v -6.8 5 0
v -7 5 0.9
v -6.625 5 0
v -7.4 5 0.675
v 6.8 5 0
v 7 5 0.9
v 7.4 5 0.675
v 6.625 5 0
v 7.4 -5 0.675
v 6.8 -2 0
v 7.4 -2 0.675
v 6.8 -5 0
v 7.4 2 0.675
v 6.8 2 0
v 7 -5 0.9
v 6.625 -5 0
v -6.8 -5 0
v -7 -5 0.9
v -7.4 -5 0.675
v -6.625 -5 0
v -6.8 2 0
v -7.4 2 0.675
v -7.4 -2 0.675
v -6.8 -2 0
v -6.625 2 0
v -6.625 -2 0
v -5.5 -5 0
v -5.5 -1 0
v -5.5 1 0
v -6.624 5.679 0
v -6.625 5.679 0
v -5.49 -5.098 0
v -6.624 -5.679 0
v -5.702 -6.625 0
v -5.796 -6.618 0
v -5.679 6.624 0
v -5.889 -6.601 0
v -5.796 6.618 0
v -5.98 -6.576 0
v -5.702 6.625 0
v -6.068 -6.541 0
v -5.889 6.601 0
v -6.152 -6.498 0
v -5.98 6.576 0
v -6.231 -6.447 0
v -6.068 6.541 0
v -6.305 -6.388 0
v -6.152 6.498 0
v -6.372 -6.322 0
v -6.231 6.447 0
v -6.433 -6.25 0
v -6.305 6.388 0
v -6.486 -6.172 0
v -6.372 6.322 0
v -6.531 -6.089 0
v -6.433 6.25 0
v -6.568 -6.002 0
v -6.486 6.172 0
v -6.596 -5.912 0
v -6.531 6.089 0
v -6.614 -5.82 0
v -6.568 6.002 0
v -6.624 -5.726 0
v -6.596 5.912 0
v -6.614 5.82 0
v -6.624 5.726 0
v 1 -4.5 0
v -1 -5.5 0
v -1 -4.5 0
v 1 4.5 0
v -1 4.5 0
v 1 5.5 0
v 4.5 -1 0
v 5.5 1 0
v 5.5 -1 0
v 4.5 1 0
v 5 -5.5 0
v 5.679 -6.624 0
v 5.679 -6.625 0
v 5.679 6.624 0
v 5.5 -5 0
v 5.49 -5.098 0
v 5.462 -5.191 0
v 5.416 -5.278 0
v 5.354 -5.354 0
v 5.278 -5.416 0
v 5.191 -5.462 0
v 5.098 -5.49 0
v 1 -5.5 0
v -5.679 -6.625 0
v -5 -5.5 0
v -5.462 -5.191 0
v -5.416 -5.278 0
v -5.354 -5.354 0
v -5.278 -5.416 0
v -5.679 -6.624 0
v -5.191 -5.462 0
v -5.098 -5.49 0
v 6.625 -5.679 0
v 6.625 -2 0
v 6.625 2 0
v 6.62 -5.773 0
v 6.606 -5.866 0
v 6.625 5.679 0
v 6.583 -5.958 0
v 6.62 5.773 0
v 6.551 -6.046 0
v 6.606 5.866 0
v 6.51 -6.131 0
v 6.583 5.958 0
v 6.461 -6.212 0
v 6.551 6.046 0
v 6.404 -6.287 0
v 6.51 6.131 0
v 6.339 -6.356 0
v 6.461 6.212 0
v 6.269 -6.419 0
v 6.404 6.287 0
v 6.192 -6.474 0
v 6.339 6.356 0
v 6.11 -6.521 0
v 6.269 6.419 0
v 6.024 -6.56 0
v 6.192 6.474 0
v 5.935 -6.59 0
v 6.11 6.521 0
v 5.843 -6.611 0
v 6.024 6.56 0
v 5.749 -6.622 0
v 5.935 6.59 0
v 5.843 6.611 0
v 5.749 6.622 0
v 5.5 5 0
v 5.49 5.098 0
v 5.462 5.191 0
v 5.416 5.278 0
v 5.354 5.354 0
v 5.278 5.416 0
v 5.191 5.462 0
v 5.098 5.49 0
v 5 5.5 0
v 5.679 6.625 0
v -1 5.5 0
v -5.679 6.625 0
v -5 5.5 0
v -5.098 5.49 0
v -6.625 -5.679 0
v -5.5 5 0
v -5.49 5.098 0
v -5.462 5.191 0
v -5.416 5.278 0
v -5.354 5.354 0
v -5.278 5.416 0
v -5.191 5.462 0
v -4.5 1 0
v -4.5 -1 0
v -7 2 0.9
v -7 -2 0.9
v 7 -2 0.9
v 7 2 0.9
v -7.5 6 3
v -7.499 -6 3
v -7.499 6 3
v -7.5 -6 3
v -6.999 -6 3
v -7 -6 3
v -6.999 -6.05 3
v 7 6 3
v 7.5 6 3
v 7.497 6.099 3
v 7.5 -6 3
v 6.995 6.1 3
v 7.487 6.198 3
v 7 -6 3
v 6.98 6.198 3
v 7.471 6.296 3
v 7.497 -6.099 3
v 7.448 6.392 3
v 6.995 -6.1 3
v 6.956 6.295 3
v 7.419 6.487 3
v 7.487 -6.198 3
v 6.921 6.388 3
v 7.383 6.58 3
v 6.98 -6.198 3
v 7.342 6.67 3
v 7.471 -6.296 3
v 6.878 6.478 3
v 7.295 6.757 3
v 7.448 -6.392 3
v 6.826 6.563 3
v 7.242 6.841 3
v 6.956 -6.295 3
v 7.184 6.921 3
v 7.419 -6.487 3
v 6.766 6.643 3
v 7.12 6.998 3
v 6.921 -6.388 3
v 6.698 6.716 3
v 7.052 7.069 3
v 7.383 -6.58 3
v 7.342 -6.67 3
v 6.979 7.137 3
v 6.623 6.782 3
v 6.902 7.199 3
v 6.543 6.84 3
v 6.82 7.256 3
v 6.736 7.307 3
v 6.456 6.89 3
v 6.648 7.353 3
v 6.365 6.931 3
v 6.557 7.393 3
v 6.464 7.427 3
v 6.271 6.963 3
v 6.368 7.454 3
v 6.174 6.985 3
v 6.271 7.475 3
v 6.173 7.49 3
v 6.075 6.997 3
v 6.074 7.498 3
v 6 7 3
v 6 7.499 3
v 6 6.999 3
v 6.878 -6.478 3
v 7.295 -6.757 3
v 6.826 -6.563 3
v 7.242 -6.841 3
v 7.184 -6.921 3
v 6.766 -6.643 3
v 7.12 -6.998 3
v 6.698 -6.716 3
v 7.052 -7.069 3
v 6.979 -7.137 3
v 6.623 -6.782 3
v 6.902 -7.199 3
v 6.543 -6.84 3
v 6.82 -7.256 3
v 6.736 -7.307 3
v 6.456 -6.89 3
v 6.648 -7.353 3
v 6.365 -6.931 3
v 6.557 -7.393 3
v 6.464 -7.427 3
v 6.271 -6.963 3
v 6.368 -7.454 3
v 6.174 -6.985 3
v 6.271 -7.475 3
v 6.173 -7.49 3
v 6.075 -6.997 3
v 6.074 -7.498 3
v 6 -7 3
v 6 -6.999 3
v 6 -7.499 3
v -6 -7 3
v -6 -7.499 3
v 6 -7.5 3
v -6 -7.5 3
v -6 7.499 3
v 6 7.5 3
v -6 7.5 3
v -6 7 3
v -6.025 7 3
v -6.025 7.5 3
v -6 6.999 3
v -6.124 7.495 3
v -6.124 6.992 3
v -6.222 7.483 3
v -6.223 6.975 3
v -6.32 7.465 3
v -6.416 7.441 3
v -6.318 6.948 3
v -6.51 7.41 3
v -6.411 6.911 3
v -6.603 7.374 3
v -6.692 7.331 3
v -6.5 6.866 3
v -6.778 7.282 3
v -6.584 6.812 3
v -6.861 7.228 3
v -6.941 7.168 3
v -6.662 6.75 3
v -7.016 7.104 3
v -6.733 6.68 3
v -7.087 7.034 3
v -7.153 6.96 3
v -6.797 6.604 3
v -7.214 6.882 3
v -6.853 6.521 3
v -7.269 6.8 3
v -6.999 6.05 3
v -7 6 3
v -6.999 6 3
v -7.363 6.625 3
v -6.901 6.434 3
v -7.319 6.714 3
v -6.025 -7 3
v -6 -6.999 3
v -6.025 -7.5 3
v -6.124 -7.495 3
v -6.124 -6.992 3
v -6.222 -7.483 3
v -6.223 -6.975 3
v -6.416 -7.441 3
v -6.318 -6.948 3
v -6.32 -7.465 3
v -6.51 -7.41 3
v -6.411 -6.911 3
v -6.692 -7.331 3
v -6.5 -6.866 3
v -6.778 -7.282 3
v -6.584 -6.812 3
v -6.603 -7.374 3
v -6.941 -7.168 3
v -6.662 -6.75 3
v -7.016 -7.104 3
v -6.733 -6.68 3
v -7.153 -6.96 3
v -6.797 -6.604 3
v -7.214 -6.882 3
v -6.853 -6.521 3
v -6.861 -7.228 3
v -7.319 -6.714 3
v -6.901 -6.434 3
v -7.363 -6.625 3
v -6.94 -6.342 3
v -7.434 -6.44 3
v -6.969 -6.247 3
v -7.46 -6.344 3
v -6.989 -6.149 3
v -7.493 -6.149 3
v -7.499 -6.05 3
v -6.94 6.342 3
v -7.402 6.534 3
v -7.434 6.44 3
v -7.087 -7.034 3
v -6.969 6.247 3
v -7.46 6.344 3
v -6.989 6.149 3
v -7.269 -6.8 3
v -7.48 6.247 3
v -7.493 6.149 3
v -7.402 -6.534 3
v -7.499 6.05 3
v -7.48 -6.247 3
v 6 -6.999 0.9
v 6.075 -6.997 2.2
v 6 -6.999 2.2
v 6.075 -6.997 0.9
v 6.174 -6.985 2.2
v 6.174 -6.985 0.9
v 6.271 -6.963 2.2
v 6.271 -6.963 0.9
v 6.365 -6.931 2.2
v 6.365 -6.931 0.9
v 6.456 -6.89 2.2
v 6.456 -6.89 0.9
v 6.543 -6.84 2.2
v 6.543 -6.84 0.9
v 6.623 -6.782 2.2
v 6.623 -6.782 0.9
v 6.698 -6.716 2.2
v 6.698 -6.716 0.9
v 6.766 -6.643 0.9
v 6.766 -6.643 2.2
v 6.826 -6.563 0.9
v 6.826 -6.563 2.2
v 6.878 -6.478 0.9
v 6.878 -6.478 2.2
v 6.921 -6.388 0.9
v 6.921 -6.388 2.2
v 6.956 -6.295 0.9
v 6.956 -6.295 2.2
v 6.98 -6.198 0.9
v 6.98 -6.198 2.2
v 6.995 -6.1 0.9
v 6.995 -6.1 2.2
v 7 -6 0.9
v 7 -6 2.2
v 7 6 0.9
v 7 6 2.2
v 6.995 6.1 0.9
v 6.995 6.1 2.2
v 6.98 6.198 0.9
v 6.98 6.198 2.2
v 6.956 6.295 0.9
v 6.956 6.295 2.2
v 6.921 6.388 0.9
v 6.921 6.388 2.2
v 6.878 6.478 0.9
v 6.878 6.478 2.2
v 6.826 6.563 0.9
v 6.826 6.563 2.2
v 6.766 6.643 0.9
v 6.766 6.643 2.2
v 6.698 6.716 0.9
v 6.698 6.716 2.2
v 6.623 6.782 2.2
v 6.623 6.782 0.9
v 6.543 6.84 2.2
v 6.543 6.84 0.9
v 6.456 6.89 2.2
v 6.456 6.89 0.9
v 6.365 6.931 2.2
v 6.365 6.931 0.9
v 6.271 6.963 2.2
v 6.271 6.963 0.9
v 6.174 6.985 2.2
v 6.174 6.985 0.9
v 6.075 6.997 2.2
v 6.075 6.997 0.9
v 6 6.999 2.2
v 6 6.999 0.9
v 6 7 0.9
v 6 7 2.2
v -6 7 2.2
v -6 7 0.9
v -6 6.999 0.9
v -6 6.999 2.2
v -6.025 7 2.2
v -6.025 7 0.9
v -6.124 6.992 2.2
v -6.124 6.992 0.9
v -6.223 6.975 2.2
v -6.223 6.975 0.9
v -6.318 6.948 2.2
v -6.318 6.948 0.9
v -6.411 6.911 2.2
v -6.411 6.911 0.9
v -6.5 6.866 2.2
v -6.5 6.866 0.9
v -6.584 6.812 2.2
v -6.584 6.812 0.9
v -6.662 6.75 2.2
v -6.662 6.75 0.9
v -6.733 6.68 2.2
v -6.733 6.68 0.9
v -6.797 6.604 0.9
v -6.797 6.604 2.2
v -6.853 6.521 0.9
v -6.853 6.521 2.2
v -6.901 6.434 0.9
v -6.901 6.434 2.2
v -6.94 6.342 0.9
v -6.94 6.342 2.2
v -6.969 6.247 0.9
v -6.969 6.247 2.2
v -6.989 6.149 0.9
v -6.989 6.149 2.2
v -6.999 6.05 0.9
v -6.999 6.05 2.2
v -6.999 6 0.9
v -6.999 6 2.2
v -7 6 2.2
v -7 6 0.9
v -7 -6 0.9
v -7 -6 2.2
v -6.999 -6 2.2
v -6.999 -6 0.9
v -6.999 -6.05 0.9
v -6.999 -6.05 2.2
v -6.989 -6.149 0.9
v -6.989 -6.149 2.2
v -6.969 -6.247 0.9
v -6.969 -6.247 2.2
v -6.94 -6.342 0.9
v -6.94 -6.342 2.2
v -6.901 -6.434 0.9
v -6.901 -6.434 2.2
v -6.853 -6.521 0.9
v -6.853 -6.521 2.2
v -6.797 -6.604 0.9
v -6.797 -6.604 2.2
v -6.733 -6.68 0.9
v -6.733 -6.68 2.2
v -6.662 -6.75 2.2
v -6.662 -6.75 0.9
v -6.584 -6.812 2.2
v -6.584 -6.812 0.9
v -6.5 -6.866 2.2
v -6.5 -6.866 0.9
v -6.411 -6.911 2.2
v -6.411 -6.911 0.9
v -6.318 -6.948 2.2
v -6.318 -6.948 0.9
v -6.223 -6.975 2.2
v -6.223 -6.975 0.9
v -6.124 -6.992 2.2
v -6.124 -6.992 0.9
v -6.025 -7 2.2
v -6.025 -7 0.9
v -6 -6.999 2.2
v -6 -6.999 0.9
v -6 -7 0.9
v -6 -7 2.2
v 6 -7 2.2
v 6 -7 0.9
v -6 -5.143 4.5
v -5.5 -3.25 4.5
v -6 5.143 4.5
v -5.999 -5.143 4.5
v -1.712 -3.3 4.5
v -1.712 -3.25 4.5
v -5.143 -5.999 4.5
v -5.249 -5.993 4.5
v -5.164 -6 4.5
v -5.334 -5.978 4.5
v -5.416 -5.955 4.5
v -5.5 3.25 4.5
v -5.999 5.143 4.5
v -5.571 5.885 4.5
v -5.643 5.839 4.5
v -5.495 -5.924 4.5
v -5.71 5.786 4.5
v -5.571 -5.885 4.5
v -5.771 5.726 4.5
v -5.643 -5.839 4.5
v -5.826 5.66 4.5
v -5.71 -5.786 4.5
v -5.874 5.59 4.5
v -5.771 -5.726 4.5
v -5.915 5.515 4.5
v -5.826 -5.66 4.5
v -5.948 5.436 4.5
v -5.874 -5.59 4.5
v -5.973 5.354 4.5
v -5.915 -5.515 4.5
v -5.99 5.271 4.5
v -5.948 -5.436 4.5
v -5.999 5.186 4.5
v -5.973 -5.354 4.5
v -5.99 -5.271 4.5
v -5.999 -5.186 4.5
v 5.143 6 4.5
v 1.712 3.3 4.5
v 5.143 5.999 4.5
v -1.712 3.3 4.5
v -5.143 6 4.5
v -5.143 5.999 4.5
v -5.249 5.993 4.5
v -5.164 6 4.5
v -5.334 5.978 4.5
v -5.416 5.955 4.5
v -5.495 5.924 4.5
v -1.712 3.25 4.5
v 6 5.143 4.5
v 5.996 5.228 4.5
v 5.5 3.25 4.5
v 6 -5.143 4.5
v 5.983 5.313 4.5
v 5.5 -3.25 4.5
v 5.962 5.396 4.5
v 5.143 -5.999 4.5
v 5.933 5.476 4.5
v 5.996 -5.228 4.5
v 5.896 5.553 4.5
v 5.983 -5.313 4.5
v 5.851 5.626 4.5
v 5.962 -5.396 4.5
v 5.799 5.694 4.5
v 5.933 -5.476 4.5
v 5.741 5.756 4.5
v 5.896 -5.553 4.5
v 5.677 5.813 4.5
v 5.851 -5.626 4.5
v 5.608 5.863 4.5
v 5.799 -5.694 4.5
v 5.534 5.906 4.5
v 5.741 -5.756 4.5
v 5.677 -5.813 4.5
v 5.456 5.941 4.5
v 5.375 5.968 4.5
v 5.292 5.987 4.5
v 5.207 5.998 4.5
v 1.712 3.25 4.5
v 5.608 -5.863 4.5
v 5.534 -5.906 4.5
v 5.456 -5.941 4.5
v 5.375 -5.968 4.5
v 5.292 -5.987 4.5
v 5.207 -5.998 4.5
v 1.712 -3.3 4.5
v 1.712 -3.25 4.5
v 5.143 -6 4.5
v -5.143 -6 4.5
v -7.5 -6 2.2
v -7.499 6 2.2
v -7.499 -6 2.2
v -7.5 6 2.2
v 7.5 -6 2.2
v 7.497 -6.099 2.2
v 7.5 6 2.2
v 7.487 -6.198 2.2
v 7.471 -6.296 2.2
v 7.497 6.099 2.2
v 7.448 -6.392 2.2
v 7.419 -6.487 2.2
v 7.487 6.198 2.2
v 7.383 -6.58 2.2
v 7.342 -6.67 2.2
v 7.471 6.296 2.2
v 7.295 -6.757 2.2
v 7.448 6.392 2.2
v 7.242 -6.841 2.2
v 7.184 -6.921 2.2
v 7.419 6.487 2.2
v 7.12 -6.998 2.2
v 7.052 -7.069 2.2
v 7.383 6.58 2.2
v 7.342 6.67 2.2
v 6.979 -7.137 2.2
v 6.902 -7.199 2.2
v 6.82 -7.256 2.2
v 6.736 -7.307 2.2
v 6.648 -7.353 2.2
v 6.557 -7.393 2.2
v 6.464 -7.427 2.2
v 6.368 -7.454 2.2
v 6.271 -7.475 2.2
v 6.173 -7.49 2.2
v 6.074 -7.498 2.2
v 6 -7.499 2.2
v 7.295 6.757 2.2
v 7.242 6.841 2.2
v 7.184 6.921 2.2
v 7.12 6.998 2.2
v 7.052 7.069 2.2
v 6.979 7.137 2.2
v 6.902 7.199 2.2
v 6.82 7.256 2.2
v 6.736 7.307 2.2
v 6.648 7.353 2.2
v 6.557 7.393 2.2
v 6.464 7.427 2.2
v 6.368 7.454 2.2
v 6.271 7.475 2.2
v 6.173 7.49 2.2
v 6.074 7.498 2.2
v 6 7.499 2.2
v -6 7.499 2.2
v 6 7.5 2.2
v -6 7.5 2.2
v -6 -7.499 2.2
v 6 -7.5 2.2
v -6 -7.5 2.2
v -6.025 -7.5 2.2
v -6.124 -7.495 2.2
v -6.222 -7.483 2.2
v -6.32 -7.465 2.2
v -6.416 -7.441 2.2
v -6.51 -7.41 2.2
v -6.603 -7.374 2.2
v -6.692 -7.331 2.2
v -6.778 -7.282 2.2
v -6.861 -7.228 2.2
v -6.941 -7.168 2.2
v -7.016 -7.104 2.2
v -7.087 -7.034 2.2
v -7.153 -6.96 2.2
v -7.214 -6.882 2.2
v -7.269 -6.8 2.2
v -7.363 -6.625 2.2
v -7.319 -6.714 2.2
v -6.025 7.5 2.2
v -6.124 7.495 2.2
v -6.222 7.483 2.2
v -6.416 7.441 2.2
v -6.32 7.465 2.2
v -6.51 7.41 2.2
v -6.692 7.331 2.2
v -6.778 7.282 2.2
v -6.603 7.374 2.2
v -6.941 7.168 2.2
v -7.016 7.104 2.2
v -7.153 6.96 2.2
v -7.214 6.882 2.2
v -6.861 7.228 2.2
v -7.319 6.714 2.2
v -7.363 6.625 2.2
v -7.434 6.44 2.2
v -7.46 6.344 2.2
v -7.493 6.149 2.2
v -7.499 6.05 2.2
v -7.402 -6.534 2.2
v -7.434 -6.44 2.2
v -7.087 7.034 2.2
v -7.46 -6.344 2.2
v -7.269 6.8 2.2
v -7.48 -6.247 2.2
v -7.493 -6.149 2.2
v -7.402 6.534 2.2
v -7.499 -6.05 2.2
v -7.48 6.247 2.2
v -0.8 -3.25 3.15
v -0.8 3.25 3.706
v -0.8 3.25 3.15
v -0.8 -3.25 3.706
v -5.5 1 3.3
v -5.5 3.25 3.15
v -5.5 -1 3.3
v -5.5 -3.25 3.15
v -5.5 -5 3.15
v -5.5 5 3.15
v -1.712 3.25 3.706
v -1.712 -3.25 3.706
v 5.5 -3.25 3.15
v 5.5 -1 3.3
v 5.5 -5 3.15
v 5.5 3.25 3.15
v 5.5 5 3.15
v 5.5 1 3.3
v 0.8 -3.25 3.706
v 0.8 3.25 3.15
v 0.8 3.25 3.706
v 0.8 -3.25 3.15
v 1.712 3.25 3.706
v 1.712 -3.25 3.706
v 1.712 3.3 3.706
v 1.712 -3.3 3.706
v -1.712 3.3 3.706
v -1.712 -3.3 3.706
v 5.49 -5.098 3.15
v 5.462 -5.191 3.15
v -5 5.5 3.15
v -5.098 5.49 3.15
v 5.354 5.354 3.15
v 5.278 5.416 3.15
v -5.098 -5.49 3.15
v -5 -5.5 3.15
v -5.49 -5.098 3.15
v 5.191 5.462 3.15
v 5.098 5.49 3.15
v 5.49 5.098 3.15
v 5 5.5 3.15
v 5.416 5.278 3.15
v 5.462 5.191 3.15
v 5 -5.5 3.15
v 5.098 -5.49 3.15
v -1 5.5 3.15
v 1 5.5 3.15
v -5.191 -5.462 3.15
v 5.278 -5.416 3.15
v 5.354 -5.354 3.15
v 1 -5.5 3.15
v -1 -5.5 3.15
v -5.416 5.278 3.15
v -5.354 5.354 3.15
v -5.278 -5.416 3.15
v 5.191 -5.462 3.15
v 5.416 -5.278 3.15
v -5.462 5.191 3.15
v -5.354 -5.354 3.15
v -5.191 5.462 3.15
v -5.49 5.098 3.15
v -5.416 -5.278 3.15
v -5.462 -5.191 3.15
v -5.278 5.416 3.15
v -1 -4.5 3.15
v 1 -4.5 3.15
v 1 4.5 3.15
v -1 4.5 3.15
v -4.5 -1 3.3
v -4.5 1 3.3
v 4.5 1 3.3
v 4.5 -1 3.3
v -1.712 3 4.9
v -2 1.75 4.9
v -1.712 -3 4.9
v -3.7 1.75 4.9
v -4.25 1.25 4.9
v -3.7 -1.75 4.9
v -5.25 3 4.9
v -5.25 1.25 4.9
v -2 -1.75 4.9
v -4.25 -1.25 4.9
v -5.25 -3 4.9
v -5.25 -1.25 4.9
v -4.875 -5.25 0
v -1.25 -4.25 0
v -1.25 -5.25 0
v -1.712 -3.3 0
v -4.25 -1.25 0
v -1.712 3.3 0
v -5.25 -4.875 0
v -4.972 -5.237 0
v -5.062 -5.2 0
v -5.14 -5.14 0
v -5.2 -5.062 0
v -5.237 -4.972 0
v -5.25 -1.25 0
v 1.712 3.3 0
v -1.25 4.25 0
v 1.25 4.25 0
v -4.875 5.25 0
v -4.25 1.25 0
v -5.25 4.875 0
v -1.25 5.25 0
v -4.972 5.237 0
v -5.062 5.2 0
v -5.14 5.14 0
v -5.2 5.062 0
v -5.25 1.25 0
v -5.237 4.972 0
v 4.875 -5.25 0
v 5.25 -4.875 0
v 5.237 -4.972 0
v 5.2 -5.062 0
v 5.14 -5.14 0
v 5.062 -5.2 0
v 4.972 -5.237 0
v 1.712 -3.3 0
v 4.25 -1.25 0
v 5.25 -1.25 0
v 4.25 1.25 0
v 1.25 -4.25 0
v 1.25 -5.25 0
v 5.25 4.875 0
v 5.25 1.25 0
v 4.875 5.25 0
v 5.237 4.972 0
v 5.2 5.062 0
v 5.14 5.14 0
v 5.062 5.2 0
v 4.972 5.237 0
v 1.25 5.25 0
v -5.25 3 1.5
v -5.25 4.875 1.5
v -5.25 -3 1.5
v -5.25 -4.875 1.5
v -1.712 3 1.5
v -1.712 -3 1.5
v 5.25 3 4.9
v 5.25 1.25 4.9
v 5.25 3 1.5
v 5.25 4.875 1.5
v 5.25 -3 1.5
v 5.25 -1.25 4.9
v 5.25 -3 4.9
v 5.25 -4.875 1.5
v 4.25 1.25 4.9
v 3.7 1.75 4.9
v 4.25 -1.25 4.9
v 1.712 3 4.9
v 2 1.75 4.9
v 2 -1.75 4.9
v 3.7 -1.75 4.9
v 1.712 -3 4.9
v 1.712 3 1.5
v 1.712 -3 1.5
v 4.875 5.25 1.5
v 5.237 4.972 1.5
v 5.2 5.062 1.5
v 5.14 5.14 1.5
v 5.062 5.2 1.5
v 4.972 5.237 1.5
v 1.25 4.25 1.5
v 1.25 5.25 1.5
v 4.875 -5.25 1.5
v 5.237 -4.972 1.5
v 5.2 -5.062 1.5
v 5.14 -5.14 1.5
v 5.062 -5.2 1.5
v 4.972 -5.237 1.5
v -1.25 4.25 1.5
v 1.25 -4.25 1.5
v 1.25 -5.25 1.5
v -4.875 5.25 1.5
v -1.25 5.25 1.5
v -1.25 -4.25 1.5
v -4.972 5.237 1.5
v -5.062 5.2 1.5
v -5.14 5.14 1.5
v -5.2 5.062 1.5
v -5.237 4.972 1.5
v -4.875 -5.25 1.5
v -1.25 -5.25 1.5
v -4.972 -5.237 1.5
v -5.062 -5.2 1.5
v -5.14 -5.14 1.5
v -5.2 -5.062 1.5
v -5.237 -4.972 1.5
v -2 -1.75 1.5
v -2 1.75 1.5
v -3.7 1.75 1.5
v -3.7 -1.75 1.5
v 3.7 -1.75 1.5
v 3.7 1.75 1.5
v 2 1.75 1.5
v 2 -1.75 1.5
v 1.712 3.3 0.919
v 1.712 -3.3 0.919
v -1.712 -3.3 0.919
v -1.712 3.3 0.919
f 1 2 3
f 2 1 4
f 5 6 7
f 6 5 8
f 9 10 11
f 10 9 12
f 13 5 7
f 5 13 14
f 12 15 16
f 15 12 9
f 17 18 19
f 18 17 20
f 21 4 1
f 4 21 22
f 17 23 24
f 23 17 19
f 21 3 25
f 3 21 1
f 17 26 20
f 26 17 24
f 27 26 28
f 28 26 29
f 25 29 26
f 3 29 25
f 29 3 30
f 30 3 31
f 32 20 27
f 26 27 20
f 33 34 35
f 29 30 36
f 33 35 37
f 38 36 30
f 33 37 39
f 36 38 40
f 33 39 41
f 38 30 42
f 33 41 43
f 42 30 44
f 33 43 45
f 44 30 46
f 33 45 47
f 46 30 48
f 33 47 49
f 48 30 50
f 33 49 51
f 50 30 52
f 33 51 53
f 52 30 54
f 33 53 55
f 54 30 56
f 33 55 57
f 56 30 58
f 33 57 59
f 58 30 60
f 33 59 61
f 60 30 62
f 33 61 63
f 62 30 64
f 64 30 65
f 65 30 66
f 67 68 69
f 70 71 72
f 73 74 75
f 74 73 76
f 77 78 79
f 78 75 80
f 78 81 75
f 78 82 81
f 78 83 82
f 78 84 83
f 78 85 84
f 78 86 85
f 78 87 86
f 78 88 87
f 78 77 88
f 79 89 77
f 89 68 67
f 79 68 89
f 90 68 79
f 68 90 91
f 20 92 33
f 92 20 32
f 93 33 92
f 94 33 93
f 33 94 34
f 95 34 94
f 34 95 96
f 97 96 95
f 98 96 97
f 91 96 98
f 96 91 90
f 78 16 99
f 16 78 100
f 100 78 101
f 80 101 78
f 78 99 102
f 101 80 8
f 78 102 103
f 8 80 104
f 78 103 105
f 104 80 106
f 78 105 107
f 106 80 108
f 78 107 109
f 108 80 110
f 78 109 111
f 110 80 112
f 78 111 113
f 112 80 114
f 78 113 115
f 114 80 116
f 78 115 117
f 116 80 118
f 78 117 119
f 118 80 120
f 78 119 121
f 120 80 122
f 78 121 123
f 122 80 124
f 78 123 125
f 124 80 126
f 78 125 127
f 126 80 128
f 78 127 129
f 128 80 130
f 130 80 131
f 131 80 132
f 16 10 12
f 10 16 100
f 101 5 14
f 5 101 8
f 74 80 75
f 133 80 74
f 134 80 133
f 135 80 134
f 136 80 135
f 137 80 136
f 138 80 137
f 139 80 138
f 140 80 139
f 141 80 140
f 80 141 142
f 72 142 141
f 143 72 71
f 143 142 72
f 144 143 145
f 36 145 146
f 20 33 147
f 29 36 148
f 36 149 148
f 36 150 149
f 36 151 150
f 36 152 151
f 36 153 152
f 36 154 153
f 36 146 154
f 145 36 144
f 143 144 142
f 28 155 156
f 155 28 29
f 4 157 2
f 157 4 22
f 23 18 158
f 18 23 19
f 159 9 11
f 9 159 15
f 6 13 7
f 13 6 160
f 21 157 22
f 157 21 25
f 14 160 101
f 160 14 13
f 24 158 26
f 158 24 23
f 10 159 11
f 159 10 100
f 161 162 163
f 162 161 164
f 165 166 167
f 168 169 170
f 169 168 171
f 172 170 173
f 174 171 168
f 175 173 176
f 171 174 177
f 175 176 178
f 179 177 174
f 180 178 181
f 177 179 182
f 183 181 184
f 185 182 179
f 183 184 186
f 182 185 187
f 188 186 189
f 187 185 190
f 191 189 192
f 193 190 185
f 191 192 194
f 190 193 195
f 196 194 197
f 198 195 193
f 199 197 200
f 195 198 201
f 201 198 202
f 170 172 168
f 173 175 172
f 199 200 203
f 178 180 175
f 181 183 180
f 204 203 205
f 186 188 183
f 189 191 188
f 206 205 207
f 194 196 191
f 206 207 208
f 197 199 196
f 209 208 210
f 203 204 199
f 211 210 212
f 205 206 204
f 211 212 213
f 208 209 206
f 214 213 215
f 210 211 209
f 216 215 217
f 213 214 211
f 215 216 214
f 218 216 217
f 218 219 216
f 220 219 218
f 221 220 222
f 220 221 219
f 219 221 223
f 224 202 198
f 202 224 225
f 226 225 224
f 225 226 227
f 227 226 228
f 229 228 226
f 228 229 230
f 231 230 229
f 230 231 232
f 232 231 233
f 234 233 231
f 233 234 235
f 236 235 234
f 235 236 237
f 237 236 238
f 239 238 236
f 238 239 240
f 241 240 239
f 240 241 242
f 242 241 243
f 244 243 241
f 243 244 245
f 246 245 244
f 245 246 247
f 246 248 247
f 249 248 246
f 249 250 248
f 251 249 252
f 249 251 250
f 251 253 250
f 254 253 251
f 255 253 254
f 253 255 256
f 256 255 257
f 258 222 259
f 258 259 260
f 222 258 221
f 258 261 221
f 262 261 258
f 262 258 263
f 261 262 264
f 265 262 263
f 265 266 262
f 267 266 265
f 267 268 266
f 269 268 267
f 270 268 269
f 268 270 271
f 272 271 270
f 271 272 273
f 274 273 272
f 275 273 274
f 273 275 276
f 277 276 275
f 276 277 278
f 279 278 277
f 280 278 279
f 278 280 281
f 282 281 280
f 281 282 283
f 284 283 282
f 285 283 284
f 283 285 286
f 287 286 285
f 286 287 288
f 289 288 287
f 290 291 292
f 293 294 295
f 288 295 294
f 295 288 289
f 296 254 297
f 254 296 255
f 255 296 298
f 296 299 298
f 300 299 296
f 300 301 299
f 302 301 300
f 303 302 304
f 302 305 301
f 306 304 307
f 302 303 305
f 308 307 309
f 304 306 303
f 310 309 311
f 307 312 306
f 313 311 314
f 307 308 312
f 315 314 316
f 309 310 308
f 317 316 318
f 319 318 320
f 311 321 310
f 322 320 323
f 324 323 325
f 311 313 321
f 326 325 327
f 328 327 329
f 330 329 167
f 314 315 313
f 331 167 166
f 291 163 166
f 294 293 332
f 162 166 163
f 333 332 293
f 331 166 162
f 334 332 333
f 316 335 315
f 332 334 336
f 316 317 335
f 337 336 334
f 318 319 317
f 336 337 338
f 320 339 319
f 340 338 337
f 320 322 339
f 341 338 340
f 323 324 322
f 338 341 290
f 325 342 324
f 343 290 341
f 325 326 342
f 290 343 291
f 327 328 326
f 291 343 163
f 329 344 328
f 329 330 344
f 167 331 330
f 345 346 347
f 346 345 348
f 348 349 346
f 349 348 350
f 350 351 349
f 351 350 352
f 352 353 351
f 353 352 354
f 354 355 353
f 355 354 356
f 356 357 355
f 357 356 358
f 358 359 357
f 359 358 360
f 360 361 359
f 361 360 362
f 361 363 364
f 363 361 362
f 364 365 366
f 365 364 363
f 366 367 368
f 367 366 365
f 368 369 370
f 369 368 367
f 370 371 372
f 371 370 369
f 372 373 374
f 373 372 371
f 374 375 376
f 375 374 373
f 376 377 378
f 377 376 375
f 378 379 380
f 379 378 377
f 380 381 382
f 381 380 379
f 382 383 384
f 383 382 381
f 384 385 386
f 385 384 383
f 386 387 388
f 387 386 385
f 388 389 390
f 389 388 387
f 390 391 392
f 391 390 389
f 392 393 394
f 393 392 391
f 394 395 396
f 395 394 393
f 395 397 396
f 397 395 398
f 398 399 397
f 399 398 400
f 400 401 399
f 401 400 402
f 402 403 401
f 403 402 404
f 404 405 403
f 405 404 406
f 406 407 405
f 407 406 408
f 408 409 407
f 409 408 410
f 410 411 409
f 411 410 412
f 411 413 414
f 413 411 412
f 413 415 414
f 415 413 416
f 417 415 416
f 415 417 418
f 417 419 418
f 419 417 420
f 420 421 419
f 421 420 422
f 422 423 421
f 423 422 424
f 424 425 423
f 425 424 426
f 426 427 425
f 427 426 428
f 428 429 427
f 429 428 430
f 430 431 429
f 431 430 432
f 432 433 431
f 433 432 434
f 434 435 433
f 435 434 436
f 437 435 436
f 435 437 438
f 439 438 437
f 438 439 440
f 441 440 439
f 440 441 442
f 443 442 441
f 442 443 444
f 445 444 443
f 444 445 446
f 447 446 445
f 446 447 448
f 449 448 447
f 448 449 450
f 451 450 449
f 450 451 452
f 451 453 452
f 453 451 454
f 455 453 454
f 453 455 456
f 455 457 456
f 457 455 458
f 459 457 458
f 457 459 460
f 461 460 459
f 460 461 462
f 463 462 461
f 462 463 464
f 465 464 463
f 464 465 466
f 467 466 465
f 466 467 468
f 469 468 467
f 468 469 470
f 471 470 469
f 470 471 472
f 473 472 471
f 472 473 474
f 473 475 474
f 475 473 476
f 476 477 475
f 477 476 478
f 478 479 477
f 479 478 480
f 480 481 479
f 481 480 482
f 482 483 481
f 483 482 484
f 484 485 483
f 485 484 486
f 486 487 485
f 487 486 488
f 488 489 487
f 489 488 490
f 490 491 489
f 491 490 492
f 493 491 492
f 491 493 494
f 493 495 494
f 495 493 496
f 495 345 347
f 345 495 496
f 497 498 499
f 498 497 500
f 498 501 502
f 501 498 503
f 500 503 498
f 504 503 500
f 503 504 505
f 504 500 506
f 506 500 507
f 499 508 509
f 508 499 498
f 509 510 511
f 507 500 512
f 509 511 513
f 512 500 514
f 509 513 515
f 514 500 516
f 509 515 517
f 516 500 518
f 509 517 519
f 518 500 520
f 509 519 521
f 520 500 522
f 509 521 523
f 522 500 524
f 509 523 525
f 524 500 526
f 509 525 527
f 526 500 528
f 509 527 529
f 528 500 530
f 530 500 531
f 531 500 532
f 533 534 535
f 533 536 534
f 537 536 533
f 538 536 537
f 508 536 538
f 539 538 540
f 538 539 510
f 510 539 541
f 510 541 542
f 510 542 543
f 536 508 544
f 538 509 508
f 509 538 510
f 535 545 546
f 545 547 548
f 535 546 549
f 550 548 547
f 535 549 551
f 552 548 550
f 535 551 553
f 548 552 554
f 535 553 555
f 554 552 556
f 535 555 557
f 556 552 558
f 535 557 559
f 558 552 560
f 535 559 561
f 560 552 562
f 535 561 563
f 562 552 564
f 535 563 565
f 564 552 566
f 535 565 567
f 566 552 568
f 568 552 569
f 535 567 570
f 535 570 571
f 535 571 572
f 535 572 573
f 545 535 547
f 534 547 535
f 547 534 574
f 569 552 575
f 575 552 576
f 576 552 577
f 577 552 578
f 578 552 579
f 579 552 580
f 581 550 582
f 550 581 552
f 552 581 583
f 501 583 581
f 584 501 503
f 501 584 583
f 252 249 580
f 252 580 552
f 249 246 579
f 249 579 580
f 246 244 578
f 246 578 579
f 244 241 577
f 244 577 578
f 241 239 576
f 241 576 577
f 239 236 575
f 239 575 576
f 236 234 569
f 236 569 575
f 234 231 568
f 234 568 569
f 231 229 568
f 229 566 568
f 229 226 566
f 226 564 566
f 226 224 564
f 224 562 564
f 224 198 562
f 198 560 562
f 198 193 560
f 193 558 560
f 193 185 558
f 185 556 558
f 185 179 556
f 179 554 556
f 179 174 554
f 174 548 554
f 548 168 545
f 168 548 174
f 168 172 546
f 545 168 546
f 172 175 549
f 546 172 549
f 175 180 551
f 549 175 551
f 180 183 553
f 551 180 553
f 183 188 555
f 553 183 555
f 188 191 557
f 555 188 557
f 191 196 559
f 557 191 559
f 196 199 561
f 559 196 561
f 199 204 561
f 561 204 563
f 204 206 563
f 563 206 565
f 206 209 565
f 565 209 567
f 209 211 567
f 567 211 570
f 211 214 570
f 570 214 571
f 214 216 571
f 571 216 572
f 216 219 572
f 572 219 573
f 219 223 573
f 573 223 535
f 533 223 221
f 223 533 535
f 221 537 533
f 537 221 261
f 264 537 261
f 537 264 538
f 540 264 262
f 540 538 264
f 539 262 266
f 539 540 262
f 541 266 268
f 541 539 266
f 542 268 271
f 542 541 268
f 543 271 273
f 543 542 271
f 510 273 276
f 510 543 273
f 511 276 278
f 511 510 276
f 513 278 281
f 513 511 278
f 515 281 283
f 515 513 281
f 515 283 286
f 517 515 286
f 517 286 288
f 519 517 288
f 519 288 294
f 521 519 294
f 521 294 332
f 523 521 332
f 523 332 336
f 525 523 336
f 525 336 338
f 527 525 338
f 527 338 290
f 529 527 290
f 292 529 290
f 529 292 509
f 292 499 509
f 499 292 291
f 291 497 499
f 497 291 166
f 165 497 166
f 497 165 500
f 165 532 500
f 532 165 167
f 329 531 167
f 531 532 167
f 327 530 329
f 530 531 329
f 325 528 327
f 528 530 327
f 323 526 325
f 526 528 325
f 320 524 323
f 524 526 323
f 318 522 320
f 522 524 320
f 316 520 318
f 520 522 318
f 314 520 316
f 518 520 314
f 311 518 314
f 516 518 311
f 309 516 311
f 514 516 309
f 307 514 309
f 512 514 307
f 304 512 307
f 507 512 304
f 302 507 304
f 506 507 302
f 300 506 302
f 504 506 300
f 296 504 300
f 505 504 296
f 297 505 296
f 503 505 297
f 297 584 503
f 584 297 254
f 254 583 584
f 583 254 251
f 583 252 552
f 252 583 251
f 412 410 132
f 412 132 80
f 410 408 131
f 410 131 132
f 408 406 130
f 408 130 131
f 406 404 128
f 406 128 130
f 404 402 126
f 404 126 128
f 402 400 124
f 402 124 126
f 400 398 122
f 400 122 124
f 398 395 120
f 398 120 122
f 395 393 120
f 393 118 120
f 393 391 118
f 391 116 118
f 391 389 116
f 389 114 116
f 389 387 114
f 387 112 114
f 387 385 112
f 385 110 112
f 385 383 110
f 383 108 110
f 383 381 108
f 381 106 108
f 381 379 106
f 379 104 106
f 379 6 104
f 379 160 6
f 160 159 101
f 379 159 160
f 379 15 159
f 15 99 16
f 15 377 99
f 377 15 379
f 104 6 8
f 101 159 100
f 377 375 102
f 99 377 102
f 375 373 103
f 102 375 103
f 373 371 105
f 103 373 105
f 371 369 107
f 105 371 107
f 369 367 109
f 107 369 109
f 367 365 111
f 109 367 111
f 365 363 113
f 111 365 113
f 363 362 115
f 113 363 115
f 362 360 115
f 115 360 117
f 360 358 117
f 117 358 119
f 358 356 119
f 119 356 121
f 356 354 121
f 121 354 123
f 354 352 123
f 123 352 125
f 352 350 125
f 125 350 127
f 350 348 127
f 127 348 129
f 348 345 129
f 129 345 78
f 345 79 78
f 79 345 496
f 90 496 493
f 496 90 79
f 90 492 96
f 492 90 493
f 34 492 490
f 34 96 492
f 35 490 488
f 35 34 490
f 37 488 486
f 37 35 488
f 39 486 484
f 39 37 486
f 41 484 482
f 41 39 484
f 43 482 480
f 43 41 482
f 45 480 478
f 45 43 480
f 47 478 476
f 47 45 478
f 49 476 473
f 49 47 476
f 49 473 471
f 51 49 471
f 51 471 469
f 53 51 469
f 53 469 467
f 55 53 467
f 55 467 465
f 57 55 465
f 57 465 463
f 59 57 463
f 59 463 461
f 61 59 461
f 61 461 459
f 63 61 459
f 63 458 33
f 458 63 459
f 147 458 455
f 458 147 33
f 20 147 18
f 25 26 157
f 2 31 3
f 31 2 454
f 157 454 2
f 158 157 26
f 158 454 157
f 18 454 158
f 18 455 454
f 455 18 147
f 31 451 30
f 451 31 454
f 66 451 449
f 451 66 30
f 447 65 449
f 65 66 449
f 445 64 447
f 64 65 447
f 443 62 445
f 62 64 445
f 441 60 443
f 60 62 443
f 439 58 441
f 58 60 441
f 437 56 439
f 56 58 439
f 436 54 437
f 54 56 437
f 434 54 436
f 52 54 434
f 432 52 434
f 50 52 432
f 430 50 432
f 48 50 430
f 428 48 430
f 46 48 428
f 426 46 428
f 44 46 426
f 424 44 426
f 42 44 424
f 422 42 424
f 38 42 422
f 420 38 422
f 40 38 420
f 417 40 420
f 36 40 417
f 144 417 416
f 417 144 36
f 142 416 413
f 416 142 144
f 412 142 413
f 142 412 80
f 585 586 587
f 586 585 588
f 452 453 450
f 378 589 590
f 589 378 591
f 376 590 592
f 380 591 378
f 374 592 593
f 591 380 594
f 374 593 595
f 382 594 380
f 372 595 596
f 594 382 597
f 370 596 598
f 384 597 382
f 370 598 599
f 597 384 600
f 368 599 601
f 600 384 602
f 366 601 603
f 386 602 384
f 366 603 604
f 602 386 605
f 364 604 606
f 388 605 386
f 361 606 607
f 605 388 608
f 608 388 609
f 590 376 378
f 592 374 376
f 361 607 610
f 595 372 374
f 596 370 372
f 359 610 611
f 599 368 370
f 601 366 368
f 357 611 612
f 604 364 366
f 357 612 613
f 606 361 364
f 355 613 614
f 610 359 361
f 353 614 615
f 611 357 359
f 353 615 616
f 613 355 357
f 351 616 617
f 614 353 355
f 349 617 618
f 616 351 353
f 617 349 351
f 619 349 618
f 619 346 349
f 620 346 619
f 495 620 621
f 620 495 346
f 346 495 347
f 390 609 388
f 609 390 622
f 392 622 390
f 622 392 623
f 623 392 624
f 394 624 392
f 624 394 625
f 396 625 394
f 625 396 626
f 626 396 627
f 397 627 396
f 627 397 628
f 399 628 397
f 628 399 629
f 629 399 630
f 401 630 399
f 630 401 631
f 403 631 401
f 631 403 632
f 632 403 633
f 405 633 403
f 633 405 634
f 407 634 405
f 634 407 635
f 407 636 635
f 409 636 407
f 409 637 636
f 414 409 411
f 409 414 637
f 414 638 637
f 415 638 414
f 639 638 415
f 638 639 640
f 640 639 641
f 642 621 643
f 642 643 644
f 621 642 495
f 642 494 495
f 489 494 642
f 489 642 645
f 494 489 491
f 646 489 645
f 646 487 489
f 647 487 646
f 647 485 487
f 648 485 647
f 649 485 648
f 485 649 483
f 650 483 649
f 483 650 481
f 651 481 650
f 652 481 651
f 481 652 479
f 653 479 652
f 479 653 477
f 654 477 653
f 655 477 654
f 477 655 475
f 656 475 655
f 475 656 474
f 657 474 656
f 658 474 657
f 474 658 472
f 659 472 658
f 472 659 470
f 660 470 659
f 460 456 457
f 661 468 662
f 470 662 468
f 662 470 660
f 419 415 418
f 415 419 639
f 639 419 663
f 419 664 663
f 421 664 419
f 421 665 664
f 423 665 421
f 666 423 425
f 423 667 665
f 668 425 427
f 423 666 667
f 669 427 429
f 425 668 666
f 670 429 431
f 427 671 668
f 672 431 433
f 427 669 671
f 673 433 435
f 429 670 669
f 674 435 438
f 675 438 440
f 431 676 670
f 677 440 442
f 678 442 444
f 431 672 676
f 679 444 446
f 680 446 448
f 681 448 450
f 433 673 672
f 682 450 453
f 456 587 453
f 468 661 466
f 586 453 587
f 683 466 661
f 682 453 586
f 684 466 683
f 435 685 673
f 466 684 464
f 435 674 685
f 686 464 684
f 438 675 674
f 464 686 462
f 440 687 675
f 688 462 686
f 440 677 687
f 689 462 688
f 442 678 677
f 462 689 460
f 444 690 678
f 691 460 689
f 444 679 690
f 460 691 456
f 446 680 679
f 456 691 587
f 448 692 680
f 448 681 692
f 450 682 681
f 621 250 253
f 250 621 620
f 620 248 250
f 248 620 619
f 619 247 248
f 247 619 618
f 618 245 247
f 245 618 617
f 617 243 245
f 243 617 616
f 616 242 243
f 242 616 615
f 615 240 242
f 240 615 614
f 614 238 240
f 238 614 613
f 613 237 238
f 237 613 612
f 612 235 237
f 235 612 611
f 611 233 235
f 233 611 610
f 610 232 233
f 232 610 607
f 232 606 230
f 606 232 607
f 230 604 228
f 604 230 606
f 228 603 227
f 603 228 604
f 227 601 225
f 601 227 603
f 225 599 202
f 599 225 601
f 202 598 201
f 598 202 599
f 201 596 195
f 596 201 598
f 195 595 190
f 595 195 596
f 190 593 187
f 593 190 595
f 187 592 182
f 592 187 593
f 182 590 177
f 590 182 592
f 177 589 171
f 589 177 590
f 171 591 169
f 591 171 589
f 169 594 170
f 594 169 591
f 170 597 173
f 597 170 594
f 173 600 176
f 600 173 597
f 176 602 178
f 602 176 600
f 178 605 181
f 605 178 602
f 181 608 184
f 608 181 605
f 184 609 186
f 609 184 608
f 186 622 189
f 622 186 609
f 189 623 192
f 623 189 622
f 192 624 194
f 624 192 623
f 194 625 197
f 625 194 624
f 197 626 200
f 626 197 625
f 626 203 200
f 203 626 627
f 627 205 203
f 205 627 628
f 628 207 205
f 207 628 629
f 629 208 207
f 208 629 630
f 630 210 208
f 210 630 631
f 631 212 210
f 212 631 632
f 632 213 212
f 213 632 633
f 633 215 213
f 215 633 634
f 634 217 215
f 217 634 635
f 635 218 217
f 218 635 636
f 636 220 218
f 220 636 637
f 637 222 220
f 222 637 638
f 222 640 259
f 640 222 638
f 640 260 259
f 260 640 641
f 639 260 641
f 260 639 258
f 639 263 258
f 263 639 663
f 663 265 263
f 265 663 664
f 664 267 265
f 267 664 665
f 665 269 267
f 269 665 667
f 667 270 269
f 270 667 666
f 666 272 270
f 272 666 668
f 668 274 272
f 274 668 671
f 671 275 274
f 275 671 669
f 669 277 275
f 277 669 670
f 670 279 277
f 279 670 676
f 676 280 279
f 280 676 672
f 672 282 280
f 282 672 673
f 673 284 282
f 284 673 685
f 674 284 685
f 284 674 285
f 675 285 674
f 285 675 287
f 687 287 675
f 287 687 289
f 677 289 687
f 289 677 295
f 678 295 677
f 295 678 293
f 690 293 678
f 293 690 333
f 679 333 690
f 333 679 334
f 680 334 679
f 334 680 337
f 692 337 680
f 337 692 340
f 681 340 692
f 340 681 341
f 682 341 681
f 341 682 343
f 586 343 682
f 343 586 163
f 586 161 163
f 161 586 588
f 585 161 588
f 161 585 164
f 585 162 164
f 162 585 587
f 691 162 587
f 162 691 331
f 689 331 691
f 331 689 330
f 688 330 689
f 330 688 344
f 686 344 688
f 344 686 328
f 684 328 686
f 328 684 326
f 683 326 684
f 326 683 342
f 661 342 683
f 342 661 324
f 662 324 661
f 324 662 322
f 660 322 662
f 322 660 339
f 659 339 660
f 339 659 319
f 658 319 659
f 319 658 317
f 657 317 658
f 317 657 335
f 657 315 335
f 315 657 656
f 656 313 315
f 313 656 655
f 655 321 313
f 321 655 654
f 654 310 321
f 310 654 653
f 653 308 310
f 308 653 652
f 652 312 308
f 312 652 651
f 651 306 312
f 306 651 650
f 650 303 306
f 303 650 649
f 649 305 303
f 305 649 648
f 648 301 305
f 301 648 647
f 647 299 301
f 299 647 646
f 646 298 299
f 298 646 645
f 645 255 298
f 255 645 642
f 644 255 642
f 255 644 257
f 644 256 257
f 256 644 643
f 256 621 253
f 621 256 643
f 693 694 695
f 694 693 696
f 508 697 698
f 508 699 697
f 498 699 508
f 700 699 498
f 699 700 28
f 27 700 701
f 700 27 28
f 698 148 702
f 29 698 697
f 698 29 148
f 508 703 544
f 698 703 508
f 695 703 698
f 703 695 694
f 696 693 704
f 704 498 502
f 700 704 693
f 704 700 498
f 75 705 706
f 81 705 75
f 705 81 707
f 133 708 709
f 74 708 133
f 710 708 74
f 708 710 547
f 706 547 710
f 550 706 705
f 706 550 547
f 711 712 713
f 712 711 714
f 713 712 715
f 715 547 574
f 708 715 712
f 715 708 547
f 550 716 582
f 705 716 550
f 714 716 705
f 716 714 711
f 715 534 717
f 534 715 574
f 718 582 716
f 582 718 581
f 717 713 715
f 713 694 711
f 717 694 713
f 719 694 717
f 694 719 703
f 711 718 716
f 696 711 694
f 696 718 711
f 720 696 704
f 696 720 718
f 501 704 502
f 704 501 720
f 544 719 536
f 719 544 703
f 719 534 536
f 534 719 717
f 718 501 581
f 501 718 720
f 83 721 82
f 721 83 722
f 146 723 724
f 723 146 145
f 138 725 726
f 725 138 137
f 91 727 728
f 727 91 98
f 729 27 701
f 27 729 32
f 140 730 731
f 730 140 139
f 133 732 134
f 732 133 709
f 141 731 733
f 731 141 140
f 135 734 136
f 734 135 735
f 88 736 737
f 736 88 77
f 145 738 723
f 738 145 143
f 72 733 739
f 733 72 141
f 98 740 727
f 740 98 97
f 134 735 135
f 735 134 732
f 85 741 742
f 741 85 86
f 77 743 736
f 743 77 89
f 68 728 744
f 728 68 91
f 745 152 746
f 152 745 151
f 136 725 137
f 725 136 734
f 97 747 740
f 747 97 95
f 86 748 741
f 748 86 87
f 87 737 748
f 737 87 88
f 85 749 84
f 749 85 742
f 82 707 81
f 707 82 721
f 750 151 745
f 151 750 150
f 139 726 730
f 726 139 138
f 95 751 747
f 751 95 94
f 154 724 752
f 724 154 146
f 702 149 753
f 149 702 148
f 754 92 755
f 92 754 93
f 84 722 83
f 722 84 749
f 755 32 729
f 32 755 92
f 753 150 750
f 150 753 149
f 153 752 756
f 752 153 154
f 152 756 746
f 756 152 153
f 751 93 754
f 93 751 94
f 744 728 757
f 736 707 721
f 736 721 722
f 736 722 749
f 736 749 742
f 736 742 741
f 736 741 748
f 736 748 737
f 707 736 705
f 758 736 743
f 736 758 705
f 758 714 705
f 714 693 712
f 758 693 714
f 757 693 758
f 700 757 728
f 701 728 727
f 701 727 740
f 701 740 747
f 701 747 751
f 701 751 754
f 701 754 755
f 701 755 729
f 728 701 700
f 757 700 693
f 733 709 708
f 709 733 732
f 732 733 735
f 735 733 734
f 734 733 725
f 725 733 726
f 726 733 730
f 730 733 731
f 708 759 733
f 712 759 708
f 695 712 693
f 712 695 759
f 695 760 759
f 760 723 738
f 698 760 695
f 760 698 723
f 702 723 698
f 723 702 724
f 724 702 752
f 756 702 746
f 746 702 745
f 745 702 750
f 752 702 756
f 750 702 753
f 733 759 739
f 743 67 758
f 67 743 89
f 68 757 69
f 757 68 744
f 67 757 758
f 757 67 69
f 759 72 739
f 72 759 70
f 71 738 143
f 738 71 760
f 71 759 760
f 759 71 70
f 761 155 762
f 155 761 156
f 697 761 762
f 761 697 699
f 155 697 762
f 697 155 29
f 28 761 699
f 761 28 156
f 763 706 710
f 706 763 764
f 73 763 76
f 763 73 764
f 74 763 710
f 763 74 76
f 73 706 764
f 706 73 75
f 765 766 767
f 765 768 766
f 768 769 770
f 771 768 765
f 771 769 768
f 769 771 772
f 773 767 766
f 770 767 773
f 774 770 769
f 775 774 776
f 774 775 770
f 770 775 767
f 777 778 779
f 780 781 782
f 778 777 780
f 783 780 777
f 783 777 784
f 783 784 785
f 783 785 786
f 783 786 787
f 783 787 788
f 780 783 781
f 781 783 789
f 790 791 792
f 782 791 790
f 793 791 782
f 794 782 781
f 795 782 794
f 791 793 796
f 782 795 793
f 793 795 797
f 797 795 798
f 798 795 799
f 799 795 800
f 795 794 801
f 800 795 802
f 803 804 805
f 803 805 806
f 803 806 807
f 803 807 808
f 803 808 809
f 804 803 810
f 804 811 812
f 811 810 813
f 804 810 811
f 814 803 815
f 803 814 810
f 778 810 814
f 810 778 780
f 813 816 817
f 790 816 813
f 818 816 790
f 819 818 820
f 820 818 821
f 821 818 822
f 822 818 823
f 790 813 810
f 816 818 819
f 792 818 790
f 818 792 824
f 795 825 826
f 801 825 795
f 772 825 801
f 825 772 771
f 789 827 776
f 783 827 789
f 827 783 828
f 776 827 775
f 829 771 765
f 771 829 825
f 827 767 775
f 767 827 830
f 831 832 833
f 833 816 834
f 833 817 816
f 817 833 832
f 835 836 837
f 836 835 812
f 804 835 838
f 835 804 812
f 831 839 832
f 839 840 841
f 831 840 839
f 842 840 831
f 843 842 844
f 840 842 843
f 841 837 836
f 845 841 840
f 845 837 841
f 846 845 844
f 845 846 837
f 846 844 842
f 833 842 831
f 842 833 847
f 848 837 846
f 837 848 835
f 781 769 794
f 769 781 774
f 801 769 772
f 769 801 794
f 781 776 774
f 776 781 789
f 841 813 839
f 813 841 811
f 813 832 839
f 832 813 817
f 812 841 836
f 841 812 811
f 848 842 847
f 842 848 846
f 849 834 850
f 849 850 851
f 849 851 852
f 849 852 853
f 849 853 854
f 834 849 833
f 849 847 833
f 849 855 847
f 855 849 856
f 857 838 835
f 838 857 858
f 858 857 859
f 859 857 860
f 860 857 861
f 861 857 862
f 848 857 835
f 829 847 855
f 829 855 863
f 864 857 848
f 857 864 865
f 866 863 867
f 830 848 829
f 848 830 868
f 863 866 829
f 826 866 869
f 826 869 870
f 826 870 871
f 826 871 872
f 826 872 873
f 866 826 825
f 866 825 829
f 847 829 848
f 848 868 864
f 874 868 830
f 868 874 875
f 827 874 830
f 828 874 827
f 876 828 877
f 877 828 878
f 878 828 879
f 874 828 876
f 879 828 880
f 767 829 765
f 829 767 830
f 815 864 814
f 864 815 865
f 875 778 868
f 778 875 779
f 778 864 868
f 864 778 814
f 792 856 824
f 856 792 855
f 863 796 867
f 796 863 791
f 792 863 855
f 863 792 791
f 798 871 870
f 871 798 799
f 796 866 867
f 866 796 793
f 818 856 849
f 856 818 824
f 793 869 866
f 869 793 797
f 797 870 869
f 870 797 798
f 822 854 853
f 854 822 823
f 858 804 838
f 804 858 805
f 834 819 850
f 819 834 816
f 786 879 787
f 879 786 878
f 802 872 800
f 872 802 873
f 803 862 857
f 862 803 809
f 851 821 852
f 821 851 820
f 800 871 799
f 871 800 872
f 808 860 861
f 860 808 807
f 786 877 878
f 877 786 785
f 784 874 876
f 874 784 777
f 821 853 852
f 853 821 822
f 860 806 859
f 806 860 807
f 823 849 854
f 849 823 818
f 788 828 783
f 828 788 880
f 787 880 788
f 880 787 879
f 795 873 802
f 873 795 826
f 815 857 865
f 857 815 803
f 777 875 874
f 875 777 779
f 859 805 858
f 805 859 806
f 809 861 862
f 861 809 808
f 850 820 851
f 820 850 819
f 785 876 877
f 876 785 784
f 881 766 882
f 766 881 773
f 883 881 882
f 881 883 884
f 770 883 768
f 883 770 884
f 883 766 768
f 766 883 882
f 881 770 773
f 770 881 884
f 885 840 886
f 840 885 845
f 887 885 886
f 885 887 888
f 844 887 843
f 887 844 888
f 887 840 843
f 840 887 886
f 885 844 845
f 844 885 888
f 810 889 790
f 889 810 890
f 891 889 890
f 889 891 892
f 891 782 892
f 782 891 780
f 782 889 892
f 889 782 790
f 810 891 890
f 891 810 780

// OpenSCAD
use <../common.scad>


$fs = $preview ? 1 : 0.1;
$fa = $preview ? 10 : 1;


/* [Main rendering options] */

// If the housing should be rendered.
render_housing = true;
// If the stem should be rendered.
render_stem = true;
// Split between housing and stem.
split = 0;


/* [Housing size] */

// Main switch housing size.
housing_size = 14;
// Switch housing corner radius.
housing_corner_radius = 1;
// Housing minimum target height.
housing_height = 4.5;
// Taper for the top of the housing.
housing_taper = 1;
// Taper height.
housing_taper_height = 1.5;
// Housing thickness (top and minimum walls).
housing_thickness = 1.5;
// Margins between the body and stem.
housing_margin = 0.25;


/* [Plate mounting] */

// Plate mount top.
plate_top = 2.2;
// Plate thickness to determine clip position.
plate_thickness = 1.3;
// Plate lip size.
plate_lip = 0.5;
// Plate lip thickness.
plate_lip_height = 0.8;
// If plate clips should be added.
plate_clips = true;
// Plate clip size.
plate_clip = 0.4;
// Plate clip width.
plate_clip_width = 3;
// Spacing between plate clips.
plate_clip_spacing = 4;


/* [Magnet sizing] */

// If the magnet is rectangular.
magnet_rectangular = true;
// Margin around the magnet.
magnet_margin = housing_margin * 0.5;
// Magnet size (radius & height or x/y, (y,) & z).
magnet_size = magnet_rectangular
    ? [1 / 8 * 25.4, 1 / 4 * 25.4, 1 / 32 * 25.4]
    : [3, 1];


/* [Switch stem sizing] */

// Offset for the stem half centers.
stem_spacing_offset = 0.6;
// Stem height extension.
stem_extension = 0.4;
// Stem stabilization slot size.
stem_stabilization = [2, 1];


/* [Keycap stem measurements] */

// Choc stem prong spacing (x).
choc_prong_spacing = 5.7;
// Choc stem prong width (x).
choc_prong_width = 1.2;
// Choc stem prong depth (y).
choc_prong_depth = 3;


/* [LED/diode cutout] */

// If the LED/diode cutout should be added.
diode_cutout = false;
// Size of the diode cutout.
diode_cutout_size = [5.3, 3.25, 2];
// Diode cutout offset.
diode_cutout_offset = 4.7;


//
// Build cube or cylinder for a magnet insert.
//
// - Parameters:
//   - size: 2 or 3 element array for magnet size.
//   - h: Magnet height override if > 0.
//   - rectangular: If the margent should be rectangular rather than cylindrical.
//   - margin: Margin around the magnet.
//
module magnet(
    size = magnet_size,
    h = 0,
    rectangular = magnet_rectangular,
    margin = magnet_margin * 2
) {
    if (!rectangular) {
        cylinder(
            h = max(h, size[1]) + margin,
            d = size[0] + margin
        );
    } else {
        cube_size = [
            size[0] + margin,
            size[len(size) > 2 ? 1 : 0] + margin,
            max(h, size[len(size) > 2 ? 2 : 1]) + margin
        ];
        translate([cube_size[0] * -0.5, cube_size[1] * -0.5, 0])
            cube(cube_size);
    }
}


//
// Build the housing shape.
//
// - Parameters:
//   - housing_height: Height for the switch housing.
//
module housing(housing_height = housing_height) {
    clip_height = plate_clip > 0 && plate_lip > 0 ? plate_top - plate_thickness : 0;
    bottom_taper = max(0.5, clip_height > 0 ? clip_height : (plate_top - plate_thickness) / 2);
    housing_main_height = housing_height - housing_taper_height - bottom_taper;
    translate([0, 0, housing_main_height / 2 + bottom_taper])
        rounded_cubeoid([housing_size, housing_size, housing_main_height], housing_corner_radius);
    if (housing_taper > 0 && housing_taper_height > 0) {
        taper = (housing_size - housing_taper * 2) / housing_size;
        translate([0, 0, housing_main_height + housing_taper_height / 2 + bottom_taper])
            rounded_cubeoid(
                [housing_size, housing_size, housing_taper_height],
                housing_corner_radius,
                scale = taper
            );
    }
    if (bottom_taper > 0) {
        taper_margin = max(plate_clip, housing_thickness * 0.5);
        clip_taper = (housing_size - taper_margin) / housing_size;
        translate([0, 0, bottom_taper * 0.5])
            rotate([180, 0, 0])
            rounded_cubeoid(
                [housing_size, housing_size, bottom_taper],
                housing_corner_radius,
                scale = clip_taper
            );
    }
    if (plate_lip > 0) {
        translate([0, 0, plate_top + plate_lip_height * 0.5])
            rounded_cubeoid(
                [housing_size + plate_lip * 2, housing_size + plate_lip * 2, plate_lip_height],
                housing_corner_radius + plate_lip
            );
    }
    if (plate_clips && clip_height > 0) {
        difference() {
            rotate([90, 0, 0])
                linear_extrude(plate_clip_width * 2 + plate_clip_spacing, center = true)
                polygon([
                    [housing_size * -0.5 + plate_clip * 0.5, 0],
                    [housing_size * -0.5 - plate_clip, clip_height * 0.75],
                    [housing_size * -0.5, clip_height],
                    [housing_size * 0.5, clip_height],
                    [housing_size * 0.5 + plate_clip, clip_height * 0.75],
                    [housing_size * 0.5 - plate_clip * 0.5, 0]
                ]);
            translate([0, 0, clip_height * 0.5 + 0.1])
                cube([
                    housing_size + plate_clip * 2 + 0.1,
                    plate_clip_spacing,
                    clip_height + 0.2
                ], center = true);
        }
    }
}


//
// Generate a pair of stem prongs for positives or negatives.
//
// - Parameters:
//   - spacing: Spacing between prong centers.
//   - width: Prong width (x).
//   - depth: Prong depth (y).
//   - height: Prong height (z).
//   - margin: Margin around the prongs.
//
module prongs(
    spacing = choc_prong_spacing,
    width = choc_prong_width,
    depth = choc_prong_depth,
    height = 5,
    margin = 0
) {
    translate([spacing * -0.5, 0, height * 0.5])
        cube([width + margin * 2, depth + margin * 2, height], center = true);
    translate([spacing * 0.5, 0, height * 0.5])
        cube([width + margin * 2, depth + margin * 2, height], center = true);
}


//
// Edge slots to help guide the stem.
//
// - Parameters:
//   - height: Height of the housing.
//   - margin: Margin aronud the slots.
//
module stem_slots(height = housing_height, margin = housing_margin) {
    cutout_size = housing_size - (max(housing_thickness, housing_taper) + margin) * 2;
    if (len(stem_stabilization) > 0) {
        translate([
            (stem_stabilization[0] + margin * 2) * -0.5,
            cutout_size * -0.5 - margin - 0.1,
            0
        ])
            cube([
                stem_stabilization[0] + margin * 2,
                stem_stabilization[1] + margin + 0.1,
                height + 0.2
            ]);
        if (!diode_cutout) {
            translate([
                (stem_stabilization[0] + margin * 2) * -0.5,
                cutout_size * 0.5 - stem_stabilization[1],
                0
            ])
                cube([
                    stem_stabilization[0] + margin * 2,
                    stem_stabilization[1] + margin + 0.1,
                    height + 0.2
                ]);
        }
        translate([
            cutout_size * -0.5 - margin - 0.1,
            (stem_stabilization[0] + margin * 2) * -0.5,
            0
        ])
            cube([
                stem_stabilization[1] + margin + 0.1,
                stem_stabilization[0] + margin * 2,
                height + 0.2
            ]);
        translate([
            cutout_size * 0.5 - stem_stabilization[1],
            (stem_stabilization[0] + margin * 2) * -0.5,
            0
        ])
            cube([
                stem_stabilization[1] + margin + 0.1,
                stem_stabilization[0] + margin * 2,
                height + 0.2
            ]);
    }
}


//
// A rounded cubeoid box sized for the bottom body of the stem.
//
// - Parameters:
//   - height: The box height.
//   - margin: The margin between housing and stem.
//
module stem_box(height = housing_thickness, margin = housing_margin) {
    cutout_size = housing_size - (max(housing_thickness, housing_taper) + margin) * 2;
    difference() {
        translate([0, 0, height / 2])
            rounded_cubeoid(
                [cutout_size, cutout_size, height],
                max(0, (housing_corner_radius - margin) / 2)
            );
        translate([0, 0, -0.1]) stem_slots();
    }
}


// Render the housing as needed.
if (render_housing) {
    translate([-split, 0, 0])
    union() {
        difference() {
            housing();
            prongs(
                spacing = choc_prong_spacing + stem_spacing_offset,
                height = housing_height + 0.1,
                margin = housing_thickness + housing_margin
            );
            translate([0, 0, housing_height - magnet_size[len(magnet_size) - 1]])
                magnet();
            cutout_size = housing_size - max(housing_thickness, housing_taper) * 2;
            translate([0, 0, (housing_height - housing_thickness) / 2 - 0.05])
                rounded_cubeoid(
                    [cutout_size, cutout_size, housing_height - 1.1],
                    housing_corner_radius / 2
                );
            if (diode_cutout) {
                translate([0, diode_cutout_offset, diode_cutout_size[2] * 0.5 - 0.1])
                    cube(
                        [diode_cutout_size[0], diode_cutout_size[1], diode_cutout_size[2] + 0.2],
                        center = true
                    );
            }
        }
        stem_slots(height = housing_height - housing_thickness + 0.1, margin = 0);
    }
}


// Render the stem as needed.
if (render_stem) {
    translate([split, 0, 0])
    difference() {
        union() {
            difference() {
                prongs(
                    spacing = choc_prong_spacing + stem_spacing_offset,
                    height = housing_height + stem_extension,
                    margin = housing_thickness
                );
                translate([0, 0, housing_thickness])
                    magnet(h = housing_height + stem_extension, margin = magnet_margin * 2);
                translate([0, 0, -0.1]) stem_slots(height = housing_height + stem_extension + 0.2);
            }
            stem_box();
        }
        translate([0, 0, housing_thickness])
            prongs(height = housing_height + stem_extension + 0.1, margin = 0.25);
        translate([0, 0, -magnet_margin]) magnet();
        if (diode_cutout) {
            translate([0, diode_cutout_offset, diode_cutout_size[2] * 0.5 - 0.1])
                cube(
                    [diode_cutout_size[0], diode_cutout_size[1], diode_cutout_size[2] + 0.2],
                    center = true
                );
        }
    }
}
